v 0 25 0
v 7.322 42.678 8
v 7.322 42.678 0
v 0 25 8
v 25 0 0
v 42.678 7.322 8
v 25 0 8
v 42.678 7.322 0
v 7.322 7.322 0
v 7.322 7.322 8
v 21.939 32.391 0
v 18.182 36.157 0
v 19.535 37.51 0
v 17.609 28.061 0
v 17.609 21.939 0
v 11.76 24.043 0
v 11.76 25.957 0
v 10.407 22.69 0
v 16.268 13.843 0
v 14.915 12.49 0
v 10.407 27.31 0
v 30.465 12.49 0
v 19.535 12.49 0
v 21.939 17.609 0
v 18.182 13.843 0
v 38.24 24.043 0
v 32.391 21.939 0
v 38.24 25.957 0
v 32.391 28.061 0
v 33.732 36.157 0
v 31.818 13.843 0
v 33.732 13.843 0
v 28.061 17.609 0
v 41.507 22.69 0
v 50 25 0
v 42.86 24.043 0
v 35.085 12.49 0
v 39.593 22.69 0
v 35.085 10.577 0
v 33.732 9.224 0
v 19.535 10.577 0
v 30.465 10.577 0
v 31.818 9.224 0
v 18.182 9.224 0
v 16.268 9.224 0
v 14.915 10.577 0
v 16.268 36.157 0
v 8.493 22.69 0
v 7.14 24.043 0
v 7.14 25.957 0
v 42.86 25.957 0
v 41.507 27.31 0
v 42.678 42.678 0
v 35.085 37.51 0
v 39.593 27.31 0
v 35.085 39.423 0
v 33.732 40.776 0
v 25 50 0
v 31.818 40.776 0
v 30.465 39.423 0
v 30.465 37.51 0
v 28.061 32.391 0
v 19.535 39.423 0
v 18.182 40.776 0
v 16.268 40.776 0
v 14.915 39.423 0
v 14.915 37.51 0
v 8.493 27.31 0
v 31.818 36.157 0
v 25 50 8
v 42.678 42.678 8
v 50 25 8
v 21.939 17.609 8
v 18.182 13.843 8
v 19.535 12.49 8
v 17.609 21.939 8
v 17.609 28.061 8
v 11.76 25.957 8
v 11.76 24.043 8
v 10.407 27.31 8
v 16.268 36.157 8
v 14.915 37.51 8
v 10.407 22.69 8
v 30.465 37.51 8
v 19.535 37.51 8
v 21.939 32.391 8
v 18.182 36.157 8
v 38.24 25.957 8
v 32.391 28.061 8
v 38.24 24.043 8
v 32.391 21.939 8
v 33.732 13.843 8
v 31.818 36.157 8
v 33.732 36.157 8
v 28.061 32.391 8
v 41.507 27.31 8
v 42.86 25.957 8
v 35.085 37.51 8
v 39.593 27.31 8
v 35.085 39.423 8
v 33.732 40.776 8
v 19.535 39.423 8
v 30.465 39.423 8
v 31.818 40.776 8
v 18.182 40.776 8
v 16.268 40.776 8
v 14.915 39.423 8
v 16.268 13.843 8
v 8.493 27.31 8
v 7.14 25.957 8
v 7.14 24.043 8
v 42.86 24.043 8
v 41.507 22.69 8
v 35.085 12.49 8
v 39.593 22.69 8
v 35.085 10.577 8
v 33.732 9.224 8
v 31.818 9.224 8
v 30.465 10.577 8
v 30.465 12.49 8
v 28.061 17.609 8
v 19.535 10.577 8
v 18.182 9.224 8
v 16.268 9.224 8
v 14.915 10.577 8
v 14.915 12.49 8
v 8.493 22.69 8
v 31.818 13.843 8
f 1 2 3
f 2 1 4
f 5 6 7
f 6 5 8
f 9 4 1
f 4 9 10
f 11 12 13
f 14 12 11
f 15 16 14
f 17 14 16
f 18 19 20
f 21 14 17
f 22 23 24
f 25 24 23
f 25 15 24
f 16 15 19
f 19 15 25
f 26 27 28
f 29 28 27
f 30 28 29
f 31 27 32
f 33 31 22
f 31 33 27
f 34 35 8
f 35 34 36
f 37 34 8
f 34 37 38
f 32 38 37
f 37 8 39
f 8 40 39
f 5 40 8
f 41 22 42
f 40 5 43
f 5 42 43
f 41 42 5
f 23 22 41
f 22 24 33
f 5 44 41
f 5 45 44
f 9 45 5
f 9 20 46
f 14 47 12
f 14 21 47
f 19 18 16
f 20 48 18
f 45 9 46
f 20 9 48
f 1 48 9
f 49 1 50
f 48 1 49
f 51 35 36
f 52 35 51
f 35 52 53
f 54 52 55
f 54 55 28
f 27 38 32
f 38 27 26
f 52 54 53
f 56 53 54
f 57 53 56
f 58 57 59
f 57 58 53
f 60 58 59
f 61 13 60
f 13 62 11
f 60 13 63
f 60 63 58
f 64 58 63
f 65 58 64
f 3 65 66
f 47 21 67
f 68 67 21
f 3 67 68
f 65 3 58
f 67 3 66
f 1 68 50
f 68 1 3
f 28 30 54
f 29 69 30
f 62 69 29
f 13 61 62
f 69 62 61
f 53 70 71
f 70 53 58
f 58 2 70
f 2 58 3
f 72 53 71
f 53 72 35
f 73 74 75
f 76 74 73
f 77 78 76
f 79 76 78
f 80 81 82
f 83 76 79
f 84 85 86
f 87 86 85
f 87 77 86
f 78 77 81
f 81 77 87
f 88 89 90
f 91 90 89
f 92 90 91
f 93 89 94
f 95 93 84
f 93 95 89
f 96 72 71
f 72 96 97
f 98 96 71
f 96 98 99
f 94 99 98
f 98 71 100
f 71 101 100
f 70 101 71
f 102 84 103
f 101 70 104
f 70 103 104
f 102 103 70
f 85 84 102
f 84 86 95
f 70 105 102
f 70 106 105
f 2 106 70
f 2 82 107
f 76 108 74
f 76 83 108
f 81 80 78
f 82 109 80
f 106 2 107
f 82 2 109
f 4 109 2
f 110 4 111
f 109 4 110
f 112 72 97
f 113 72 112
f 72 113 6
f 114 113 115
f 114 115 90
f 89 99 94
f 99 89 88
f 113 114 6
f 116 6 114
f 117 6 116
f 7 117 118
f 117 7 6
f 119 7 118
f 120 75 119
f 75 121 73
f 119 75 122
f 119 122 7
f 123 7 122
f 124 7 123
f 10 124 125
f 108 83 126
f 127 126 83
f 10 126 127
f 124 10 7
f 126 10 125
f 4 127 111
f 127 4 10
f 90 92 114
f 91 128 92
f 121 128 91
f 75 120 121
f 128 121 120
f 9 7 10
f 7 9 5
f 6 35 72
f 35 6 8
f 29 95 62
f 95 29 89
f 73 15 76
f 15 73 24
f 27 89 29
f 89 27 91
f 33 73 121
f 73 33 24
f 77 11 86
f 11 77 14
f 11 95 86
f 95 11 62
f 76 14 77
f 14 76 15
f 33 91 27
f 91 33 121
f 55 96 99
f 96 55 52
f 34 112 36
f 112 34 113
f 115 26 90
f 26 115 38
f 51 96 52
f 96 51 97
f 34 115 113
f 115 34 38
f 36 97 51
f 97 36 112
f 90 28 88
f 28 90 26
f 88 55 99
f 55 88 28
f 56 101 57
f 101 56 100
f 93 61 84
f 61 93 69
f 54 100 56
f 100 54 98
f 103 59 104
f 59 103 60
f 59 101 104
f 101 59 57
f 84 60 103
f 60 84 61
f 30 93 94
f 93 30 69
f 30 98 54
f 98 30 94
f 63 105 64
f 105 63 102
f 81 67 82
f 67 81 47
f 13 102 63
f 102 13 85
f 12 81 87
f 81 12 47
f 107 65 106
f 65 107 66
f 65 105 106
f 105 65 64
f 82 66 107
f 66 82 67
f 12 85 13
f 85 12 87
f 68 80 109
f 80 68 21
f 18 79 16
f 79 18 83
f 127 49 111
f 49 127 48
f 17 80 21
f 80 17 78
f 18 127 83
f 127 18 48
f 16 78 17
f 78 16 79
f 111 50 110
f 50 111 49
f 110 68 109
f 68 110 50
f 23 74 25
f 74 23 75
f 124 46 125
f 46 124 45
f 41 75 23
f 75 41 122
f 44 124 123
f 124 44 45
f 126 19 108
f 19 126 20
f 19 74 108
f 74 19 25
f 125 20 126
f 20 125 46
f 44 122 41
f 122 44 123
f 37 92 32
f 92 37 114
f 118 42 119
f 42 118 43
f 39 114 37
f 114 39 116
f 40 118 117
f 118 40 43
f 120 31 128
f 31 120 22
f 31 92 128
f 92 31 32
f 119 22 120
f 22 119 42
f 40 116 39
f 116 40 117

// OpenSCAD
$fn = 32;

// ----------------------------------------------------------------------
// Polygon plate: 8-gon R25, 6 bolt windows
// ----------------------------------------------------------------------

// --- parameters (mm) ---
sides = 8;                // number of polygon sides
plate_r = 25;             // circumscribed radius of the polygon
bore_r = 8;               // centre bore radius
bolts = 6;                // number of bolt windows
ring_r = 15.55;           // bolt-circle radius
bolt_r = 2.5;             // bolt window radius
plate_t = 8;              // plate thickness, Z (extrusion height)

plate_d = 2 * plate_r;  // circumscribed diameter
bore_d = 2 * bore_r;  // centre bore diameter
bolt_d = 2 * bolt_r;  // bolt window diameter
ring_d = 2 * ring_r;  // bolt-circle diameter

profile = [[50, 25], [42.678, 42.678], [25, 50], [7.322, 42.678], [0, 25], [7.322, 7.322], [25, 0], [42.678, 7.322]];  // primary outline, 8 points, counter clockwise
void_1 = [[32.391, 28.061], [28.061, 32.391], [21.939, 32.391], [17.609, 28.061], [17.609, 21.939], [21.939, 17.609], [28.061, 17.609], [32.391, 21.939]];  // centre bore, 8 points
void_2 = [[42.86, 25.957], [41.507, 27.31], [39.593, 27.31], [38.24, 25.957], [38.24, 24.043], [39.593, 22.69], [41.507, 22.69], [42.86, 24.043]];  // bolt window 1, 8 points
void_3 = [[35.085, 39.423], [33.732, 40.776], [31.818, 40.776], [30.465, 39.423], [30.465, 37.51], [31.818, 36.157], [33.732, 36.157], [35.085, 37.51]];  // bolt window 2, 8 points
void_4 = [[19.535, 39.423], [18.182, 40.776], [16.268, 40.776], [14.915, 39.423], [14.915, 37.51], [16.268, 36.157], [18.182, 36.157], [19.535, 37.51]];  // bolt window 3, 8 points
void_5 = [[11.76, 25.957], [10.407, 27.31], [8.493, 27.31], [7.14, 25.957], [7.14, 24.043], [8.493, 22.69], [10.407, 22.69], [11.76, 24.043]];  // bolt window 4, 8 points
void_6 = [[19.535, 12.49], [18.182, 13.843], [16.268, 13.843], [14.915, 12.49], [14.915, 10.577], [16.268, 9.224], [18.182, 9.224], [19.535, 10.577]];  // bolt window 5, 8 points
void_7 = [[35.085, 12.49], [33.732, 13.843], [31.818, 13.843], [30.465, 12.49], [30.465, 10.577], [31.818, 9.224], [33.732, 9.224], [35.085, 10.577]];  // bolt window 6, 8 points

// --- the one profile operation ---
difference() {
  linear_extrude(height = plate_t) polygon(points = profile);
  translate([0, 0, -1])
    linear_extrude(height = plate_t + 2) polygon(points = void_1);
  translate([0, 0, -1])
    linear_extrude(height = plate_t + 2) polygon(points = void_2);
  translate([0, 0, -1])
    linear_extrude(height = plate_t + 2) polygon(points = void_3);
  translate([0, 0, -1])
    linear_extrude(height = plate_t + 2) polygon(points = void_4);
  translate([0, 0, -1])
    linear_extrude(height = plate_t + 2) polygon(points = void_5);
  translate([0, 0, -1])
    linear_extrude(height = plate_t + 2) polygon(points = void_6);
  translate([0, 0, -1])
    linear_extrude(height = plate_t + 2) polygon(points = void_7);
}
